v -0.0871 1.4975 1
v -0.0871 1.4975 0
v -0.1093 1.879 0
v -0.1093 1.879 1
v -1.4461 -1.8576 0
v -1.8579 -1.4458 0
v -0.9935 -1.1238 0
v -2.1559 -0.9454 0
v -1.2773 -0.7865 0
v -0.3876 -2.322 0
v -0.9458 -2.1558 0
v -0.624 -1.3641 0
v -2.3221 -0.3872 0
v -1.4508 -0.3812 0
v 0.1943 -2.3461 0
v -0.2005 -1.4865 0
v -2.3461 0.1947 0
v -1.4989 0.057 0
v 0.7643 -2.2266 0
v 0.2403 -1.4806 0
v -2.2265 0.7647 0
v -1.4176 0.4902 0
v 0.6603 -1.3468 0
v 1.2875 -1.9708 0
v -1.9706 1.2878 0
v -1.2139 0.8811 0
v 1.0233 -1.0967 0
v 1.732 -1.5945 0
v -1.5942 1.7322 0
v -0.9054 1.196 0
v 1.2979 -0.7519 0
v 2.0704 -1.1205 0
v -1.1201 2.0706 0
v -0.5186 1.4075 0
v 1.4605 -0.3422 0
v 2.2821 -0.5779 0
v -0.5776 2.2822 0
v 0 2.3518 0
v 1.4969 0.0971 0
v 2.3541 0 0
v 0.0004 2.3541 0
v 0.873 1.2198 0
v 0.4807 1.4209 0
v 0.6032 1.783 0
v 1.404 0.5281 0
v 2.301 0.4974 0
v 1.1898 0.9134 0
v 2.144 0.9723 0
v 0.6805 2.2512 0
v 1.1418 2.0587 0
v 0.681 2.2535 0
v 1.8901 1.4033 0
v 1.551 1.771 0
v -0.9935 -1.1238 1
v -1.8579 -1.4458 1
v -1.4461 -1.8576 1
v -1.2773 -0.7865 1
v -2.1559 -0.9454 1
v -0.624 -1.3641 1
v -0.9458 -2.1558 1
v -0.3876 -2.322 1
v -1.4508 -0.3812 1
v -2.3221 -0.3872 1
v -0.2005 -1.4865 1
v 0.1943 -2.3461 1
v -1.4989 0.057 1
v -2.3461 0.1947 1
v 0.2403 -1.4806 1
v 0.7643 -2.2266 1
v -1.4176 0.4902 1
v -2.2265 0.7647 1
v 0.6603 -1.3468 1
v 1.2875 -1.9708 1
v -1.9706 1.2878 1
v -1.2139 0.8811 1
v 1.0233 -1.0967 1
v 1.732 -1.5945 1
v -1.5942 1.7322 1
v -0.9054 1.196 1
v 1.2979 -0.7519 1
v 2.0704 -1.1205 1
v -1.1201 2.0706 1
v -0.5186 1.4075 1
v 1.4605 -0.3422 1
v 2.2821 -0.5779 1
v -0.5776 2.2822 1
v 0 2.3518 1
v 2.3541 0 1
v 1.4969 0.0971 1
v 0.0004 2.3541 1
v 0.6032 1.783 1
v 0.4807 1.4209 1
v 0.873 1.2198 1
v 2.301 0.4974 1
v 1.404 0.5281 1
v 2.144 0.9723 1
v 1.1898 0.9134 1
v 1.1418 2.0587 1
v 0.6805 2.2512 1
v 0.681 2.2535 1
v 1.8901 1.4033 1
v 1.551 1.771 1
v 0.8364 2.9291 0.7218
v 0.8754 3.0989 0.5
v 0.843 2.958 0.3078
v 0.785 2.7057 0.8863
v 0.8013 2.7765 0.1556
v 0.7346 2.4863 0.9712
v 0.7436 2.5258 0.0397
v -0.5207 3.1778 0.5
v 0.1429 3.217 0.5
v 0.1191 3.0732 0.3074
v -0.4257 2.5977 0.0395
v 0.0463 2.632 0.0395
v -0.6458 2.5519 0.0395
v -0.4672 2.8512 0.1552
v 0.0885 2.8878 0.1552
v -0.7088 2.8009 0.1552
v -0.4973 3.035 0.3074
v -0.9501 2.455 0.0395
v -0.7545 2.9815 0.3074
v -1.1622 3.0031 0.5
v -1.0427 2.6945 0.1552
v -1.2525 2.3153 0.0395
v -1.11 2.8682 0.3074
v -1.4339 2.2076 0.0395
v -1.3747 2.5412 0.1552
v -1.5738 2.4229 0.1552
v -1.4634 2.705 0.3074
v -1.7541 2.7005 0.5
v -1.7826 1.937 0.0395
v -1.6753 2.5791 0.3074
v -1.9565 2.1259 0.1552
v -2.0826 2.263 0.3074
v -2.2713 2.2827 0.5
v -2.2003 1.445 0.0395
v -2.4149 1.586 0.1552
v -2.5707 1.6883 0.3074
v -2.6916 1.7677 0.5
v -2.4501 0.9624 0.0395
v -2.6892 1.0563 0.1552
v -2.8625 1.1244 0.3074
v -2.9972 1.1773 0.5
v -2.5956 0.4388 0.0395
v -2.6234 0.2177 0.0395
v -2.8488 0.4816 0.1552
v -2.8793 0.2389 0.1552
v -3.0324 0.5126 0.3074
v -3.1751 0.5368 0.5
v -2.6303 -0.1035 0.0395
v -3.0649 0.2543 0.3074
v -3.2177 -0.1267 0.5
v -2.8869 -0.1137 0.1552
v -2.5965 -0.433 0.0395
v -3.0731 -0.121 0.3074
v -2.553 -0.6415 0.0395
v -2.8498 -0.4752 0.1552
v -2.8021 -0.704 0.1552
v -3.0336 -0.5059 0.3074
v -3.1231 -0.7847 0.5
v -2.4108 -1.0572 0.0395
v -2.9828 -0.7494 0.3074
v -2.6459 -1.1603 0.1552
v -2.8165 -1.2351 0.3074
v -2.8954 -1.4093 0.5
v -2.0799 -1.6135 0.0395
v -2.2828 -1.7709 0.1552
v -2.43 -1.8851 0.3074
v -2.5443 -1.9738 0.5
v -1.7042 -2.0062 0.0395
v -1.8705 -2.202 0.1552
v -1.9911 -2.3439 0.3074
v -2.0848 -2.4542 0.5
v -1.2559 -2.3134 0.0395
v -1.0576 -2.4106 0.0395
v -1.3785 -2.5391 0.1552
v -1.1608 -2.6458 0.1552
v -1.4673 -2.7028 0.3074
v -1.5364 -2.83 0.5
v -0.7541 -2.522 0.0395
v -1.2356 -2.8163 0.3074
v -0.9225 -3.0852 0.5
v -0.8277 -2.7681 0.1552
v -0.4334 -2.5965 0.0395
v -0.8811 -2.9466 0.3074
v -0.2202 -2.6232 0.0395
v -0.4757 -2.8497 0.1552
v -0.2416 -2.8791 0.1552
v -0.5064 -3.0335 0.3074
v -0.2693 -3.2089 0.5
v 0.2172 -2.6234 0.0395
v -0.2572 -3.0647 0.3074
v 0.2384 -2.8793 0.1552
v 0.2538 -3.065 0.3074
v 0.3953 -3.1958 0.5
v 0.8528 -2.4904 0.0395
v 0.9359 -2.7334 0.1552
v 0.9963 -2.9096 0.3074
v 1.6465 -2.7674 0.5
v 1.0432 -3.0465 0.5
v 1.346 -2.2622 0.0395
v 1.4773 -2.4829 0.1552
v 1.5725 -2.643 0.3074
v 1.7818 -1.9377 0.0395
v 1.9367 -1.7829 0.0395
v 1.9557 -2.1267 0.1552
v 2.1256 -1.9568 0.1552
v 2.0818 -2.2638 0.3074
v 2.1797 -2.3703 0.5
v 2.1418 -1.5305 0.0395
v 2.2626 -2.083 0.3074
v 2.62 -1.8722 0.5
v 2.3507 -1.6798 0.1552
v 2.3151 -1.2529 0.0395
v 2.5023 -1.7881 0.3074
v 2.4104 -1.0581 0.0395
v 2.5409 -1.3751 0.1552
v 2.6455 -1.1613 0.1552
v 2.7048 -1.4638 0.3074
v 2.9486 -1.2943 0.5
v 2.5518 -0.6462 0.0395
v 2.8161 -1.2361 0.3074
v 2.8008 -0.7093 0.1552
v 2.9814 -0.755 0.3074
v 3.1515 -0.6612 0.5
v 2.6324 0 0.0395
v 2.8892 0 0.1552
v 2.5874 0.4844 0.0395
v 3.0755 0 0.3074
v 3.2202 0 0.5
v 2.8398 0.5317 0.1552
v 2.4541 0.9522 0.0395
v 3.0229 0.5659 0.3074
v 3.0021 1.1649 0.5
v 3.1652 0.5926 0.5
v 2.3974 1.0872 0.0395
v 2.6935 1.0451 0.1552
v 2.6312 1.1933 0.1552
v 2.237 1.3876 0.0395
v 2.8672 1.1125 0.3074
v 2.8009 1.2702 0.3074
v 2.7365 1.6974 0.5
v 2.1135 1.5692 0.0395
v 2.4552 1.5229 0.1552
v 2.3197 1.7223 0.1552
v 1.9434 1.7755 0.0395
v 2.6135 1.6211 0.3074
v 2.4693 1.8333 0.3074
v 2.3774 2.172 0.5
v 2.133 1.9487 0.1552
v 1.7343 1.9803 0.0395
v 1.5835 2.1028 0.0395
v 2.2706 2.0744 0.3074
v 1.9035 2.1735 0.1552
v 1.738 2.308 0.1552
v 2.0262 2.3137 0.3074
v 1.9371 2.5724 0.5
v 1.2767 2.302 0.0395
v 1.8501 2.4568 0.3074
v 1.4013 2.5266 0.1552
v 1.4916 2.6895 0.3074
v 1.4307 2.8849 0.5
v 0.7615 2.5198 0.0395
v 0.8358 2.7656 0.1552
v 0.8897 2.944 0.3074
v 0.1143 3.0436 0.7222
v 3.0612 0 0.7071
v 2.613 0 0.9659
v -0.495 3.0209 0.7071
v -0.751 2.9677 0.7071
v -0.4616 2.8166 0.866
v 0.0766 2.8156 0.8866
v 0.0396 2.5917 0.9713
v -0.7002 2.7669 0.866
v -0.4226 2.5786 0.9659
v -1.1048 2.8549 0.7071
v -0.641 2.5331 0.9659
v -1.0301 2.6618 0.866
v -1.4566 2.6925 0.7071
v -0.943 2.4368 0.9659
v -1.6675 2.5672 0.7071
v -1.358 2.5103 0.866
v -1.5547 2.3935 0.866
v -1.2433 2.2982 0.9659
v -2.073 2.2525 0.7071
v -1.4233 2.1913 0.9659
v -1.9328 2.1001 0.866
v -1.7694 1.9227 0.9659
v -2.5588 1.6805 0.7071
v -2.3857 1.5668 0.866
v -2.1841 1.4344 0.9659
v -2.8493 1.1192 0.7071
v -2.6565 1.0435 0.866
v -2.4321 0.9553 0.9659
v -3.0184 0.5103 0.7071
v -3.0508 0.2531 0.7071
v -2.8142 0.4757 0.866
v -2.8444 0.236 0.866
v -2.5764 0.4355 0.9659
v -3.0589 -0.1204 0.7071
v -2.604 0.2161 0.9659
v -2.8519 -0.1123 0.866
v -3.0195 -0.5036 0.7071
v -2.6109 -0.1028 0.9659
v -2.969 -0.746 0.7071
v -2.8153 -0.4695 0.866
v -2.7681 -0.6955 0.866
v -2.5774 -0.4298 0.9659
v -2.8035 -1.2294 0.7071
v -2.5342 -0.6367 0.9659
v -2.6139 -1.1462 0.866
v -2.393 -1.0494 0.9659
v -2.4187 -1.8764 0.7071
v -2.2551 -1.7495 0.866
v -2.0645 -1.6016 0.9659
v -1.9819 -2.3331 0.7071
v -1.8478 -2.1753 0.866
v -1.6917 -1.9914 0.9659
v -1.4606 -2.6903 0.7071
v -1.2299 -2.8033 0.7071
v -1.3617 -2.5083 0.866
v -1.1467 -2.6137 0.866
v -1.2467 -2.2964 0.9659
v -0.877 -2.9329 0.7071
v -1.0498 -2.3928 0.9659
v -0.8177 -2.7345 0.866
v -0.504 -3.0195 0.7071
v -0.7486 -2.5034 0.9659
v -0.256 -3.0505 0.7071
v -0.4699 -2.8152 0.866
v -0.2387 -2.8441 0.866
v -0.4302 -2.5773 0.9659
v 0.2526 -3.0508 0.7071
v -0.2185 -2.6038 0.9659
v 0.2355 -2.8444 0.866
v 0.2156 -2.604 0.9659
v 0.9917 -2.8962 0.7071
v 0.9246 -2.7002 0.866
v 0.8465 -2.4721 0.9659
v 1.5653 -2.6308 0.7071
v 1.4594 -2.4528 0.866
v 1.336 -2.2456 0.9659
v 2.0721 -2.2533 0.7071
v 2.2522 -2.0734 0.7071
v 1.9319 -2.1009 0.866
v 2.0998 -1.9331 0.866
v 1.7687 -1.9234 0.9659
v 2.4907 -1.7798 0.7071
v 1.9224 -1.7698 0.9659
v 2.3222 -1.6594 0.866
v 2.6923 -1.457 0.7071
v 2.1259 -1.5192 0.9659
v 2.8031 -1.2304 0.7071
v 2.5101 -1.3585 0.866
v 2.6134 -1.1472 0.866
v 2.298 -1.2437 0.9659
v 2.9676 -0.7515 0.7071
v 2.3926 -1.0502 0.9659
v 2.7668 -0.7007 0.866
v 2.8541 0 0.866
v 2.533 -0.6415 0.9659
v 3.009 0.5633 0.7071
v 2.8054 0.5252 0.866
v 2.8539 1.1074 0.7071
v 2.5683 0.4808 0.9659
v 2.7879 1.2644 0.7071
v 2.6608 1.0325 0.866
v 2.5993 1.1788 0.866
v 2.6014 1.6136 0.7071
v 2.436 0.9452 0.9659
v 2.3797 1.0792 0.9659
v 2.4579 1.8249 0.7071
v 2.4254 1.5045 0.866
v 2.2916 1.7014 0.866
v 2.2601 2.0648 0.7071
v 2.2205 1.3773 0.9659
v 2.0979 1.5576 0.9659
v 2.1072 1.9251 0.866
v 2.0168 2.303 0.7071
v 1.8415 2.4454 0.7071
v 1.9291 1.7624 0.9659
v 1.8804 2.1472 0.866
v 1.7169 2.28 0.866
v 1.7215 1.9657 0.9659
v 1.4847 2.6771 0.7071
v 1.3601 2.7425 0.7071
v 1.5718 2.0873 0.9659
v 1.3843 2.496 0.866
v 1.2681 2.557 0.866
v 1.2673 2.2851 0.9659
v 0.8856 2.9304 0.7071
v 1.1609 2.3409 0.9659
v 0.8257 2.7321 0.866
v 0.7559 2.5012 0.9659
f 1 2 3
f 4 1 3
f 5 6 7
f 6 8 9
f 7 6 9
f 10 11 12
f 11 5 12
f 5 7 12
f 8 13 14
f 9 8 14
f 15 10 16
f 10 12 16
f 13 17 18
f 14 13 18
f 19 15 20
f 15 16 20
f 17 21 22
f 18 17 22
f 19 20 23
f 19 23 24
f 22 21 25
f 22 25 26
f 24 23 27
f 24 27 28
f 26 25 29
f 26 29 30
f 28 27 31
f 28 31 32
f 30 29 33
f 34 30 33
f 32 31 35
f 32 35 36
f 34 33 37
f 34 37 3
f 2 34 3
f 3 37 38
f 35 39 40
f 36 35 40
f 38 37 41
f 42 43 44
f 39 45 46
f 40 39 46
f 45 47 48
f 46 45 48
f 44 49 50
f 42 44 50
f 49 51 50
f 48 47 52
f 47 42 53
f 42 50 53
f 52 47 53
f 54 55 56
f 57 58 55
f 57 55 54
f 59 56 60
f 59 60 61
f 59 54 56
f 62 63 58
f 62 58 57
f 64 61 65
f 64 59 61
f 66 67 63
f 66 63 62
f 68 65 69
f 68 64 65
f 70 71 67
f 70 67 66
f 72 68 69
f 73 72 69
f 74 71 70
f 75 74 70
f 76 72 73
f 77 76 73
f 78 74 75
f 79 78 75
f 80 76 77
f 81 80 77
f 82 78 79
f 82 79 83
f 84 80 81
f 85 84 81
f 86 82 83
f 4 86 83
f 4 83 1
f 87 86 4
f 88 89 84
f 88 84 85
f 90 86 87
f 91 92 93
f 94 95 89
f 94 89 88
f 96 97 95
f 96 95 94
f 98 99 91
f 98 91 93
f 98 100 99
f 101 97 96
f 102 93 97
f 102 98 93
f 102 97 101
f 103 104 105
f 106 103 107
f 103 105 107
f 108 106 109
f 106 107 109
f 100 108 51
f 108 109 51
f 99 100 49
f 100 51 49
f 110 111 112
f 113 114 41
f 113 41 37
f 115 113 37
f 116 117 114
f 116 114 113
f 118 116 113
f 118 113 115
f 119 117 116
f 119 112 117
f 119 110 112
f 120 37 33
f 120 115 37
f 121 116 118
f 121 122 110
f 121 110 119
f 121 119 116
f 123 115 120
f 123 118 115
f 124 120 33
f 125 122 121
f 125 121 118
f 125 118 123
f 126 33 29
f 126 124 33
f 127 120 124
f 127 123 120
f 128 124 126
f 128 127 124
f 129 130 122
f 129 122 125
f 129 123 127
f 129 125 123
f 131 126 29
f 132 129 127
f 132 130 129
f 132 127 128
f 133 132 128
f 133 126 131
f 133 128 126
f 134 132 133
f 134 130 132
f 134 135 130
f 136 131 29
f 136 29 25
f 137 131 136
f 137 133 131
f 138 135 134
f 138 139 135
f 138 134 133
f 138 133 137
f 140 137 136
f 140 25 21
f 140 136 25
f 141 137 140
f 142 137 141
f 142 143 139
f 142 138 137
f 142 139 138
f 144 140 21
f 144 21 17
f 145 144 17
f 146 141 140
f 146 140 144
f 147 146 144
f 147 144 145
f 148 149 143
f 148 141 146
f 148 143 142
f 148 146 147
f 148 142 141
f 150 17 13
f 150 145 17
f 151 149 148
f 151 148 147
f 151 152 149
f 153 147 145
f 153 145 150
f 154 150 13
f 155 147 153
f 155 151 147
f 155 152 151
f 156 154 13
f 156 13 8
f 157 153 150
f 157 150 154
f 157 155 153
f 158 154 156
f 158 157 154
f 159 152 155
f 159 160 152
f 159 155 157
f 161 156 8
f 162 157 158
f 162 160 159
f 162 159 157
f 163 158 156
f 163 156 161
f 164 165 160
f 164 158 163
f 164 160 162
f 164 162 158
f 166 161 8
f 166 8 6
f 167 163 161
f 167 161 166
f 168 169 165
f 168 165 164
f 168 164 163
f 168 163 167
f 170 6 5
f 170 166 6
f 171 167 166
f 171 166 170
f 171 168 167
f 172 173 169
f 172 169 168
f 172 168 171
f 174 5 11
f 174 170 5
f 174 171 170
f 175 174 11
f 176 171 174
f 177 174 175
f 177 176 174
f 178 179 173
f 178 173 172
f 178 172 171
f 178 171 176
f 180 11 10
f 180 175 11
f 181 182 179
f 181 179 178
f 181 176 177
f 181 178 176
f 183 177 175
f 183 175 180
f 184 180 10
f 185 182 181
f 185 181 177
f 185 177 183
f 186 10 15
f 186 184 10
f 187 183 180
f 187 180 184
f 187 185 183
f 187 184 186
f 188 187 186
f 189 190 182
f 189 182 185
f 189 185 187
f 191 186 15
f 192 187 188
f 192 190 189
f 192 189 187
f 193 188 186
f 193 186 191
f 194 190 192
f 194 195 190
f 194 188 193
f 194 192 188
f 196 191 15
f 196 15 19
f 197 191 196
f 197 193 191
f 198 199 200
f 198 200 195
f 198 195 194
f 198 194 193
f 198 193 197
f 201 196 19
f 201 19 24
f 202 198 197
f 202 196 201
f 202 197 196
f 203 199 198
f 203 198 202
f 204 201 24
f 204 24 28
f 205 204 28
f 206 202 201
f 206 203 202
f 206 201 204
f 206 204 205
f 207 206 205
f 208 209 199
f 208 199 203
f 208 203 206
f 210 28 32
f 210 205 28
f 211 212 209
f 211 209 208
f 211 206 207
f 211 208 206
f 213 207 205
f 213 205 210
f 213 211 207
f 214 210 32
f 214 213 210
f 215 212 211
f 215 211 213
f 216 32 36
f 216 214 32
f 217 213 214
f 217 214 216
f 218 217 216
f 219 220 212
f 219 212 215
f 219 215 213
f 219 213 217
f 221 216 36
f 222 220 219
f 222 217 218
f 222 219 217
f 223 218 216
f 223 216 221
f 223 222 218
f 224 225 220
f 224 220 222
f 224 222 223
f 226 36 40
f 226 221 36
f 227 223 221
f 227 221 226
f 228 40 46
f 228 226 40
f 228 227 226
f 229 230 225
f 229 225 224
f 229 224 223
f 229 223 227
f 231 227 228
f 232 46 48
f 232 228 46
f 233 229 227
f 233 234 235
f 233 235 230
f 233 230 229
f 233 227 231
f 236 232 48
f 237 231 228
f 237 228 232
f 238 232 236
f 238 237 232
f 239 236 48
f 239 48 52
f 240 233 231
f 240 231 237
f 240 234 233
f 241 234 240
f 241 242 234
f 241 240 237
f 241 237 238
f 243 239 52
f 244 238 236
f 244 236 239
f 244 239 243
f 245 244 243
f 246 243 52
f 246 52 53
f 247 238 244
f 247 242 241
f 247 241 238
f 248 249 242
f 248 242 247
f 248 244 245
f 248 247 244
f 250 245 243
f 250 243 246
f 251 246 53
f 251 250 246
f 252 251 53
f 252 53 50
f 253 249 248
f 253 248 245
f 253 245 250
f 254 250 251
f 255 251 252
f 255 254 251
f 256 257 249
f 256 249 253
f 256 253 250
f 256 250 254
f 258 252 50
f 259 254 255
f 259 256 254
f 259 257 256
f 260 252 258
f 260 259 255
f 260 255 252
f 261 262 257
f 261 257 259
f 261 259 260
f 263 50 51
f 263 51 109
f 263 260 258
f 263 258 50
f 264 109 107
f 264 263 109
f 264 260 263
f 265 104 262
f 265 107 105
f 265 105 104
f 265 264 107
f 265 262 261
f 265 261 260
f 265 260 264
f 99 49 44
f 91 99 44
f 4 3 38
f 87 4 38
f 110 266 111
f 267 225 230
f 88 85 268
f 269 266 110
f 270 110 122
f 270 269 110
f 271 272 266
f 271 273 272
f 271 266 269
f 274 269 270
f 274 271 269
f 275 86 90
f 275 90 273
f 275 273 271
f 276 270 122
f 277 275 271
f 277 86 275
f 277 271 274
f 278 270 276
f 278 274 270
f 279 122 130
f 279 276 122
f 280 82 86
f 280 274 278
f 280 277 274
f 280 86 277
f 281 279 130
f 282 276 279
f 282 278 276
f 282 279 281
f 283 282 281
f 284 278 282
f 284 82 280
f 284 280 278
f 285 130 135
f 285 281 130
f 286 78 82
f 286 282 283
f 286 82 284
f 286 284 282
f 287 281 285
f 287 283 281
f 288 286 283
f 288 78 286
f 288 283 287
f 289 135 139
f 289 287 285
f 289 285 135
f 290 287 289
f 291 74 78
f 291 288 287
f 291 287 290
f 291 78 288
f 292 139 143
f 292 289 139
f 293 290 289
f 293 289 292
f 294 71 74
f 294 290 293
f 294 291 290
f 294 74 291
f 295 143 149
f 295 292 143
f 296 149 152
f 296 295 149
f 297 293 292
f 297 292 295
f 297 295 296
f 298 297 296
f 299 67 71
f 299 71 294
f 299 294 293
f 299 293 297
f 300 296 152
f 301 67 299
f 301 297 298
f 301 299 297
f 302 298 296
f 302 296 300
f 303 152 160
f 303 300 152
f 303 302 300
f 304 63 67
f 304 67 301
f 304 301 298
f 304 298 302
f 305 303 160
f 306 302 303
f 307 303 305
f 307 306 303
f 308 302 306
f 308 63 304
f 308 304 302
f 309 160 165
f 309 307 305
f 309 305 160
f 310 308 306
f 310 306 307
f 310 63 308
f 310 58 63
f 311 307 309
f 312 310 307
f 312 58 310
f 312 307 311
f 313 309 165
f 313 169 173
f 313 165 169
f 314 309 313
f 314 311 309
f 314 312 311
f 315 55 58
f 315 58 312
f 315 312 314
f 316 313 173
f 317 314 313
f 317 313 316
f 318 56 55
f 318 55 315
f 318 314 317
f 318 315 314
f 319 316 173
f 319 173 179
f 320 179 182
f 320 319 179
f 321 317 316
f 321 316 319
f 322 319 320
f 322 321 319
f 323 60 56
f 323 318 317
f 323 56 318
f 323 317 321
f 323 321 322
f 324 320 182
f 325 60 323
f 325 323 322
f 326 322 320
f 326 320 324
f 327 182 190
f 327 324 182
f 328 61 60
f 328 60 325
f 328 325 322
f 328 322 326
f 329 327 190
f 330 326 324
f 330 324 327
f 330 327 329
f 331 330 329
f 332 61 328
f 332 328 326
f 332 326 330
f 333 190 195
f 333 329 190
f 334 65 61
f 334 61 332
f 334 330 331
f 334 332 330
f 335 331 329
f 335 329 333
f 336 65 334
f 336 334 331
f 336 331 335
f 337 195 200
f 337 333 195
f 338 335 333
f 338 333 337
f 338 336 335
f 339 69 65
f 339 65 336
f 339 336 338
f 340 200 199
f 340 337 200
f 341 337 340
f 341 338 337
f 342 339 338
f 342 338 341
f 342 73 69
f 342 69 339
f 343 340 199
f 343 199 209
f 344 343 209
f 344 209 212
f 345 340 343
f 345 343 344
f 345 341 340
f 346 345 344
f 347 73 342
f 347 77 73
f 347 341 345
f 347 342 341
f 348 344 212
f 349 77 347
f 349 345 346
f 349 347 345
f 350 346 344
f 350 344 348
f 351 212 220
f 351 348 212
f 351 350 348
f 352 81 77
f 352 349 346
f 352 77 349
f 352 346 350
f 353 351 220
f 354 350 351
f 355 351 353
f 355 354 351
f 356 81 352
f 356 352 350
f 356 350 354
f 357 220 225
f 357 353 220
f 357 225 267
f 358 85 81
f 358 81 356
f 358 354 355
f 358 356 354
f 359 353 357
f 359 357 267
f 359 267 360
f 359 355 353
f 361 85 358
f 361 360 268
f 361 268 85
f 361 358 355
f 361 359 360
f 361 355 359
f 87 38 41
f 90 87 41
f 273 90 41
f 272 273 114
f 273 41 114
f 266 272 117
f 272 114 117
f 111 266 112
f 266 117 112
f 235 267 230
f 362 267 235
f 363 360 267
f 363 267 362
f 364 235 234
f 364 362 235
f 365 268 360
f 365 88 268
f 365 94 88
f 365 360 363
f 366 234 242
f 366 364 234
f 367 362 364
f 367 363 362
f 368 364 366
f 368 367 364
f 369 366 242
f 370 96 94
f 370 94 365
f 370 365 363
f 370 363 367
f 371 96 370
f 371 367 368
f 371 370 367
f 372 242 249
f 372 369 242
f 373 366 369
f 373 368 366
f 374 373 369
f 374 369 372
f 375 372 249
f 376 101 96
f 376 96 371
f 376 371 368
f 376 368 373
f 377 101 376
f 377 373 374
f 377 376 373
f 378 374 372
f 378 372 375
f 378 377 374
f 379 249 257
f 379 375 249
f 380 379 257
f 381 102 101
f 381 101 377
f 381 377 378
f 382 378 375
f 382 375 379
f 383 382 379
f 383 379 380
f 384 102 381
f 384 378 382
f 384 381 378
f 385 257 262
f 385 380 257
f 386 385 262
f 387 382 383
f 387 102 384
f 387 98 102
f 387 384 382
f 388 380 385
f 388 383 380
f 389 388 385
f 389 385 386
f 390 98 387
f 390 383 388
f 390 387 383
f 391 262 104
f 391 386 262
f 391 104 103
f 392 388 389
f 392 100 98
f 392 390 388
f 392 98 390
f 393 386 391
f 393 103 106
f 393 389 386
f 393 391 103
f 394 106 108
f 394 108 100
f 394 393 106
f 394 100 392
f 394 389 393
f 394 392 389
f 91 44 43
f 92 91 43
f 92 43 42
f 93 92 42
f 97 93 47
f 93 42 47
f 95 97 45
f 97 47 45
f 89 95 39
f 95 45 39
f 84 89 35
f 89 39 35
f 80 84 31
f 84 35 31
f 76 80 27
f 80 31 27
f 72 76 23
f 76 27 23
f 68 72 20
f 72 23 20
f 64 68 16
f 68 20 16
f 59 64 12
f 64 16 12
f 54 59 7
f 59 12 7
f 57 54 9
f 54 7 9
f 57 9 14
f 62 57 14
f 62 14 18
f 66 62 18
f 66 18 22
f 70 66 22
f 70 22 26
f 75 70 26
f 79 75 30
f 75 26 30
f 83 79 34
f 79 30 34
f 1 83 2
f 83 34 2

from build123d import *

# Parameters (mm, degrees)
EXTRUDE_1_DEPTH = 1
FILLET_4_R      = 1


with BuildPart() as part:
    # Эскиз1 → Бобышка-Вытянуть1 (new body)
    with BuildSketch(Plane.XY):
        with BuildLine():
            ThreePointArc((0.480680501, 1.420896286), (-0.200493603, -1.486540385), (-0.087072694, 1.497470649))
            Line((-0.087072694, 1.497470649), (-0.109259646, 1.879040442))
            Line((-0.109259646, 1.879040442), (0, 2.351791755))
            Line((0, 2.351791755), (0.164870261, 3.350081286))
            ThreePointArc((0.164870261, 3.350081286), (-2.42932337, -2.312707243), (3.35413578, 0))
            ThreePointArc((3.35413578, 0), (2.672755085, 2.02647652), (0.905453106, 3.229610116))
            Line((0.905453106, 3.229610116), (0.680492814, 2.251189461))
            Line((0.680492814, 2.251189461), (0.603162473, 1.782954201))
            Line((0.603162473, 1.782954201), (0.480680501, 1.420896286))
        make_face()
    extrude(amount=EXTRUDE_1_DEPTH)

    # Скругление4
    # the kernel refuses this fillet: 1 mm, written as the material it takes off along each edge
    with BuildSketch(Plane(origin=(0, 0, 0), x_dir=(0.7154585418430487, 0.6986551902790236, 0), z_dir=(0.6986551902790236, -0.7154585418430487, 0))) as fillet_4_piece_1:
        with BuildLine():
            CenterArc((3.35413578 - FILLET_4_R, FILLET_4_R), FILLET_4_R, 270, 90)
            Line((3.35413578 - FILLET_4_R, 0), (3.35413578, 0))
            Line((3.35413578, 0), (3.35413578, FILLET_4_R))
        make_face()
    revolve(axis=Axis((0, 0, 0), (0, 0, 1)), revolution_arc=315.68079094, mode=Mode.SUBTRACT)
    with BuildSketch(Plane(origin=(0, 0, 1), x_dir=(0.7154585418430487, 0.6986551902790236, 0), z_dir=(0.6986551902790236, -0.7154585418430487, 0))) as fillet_4_piece_2:
        with BuildLine():
            CenterArc((3.35413578 - FILLET_4_R, -FILLET_4_R), FILLET_4_R, 0, 90)
            Line((3.35413578 - FILLET_4_R, 0), (3.35413578, 0))
            Line((3.35413578, 0), (3.35413578, -FILLET_4_R))
        make_face()
    revolve(axis=Axis((0, 0, 1), (0, 0, 1)), revolution_arc=315.68079094, mode=Mode.SUBTRACT)
    with BuildSketch(Plane(origin=(0, 0, 1), x_dir=(1, 0, 0), z_dir=(0, -1, 0))) as fillet_4_piece_3:
        with BuildLine():
            CenterArc((3.35413578 - FILLET_4_R, -FILLET_4_R), FILLET_4_R, 0, 90)
            Line((3.35413578 - FILLET_4_R, 0), (3.35413578, 0))
            Line((3.35413578, 0), (3.35413578, -FILLET_4_R))
        make_face()
    revolve(axis=Axis((0, 0, 1), (0, 0, 1)), revolution_arc=117.055659858, mode=Mode.SUBTRACT)
    with BuildSketch(Plane(origin=(0, 0, 0), x_dir=(1, 0, 0), z_dir=(0, -1, 0))) as fillet_4_piece_4:
        with BuildLine():
            CenterArc((3.35413578 - FILLET_4_R, FILLET_4_R), FILLET_4_R, 270, 90)
            Line((3.35413578 - FILLET_4_R, 0), (3.35413578, 0))
            Line((3.35413578, 0), (3.35413578, FILLET_4_R))
        make_face()
    revolve(axis=Axis((0, 0, 0), (0, 0, 1)), revolution_arc=117.055659858, mode=Mode.SUBTRACT)


solid = part.part
